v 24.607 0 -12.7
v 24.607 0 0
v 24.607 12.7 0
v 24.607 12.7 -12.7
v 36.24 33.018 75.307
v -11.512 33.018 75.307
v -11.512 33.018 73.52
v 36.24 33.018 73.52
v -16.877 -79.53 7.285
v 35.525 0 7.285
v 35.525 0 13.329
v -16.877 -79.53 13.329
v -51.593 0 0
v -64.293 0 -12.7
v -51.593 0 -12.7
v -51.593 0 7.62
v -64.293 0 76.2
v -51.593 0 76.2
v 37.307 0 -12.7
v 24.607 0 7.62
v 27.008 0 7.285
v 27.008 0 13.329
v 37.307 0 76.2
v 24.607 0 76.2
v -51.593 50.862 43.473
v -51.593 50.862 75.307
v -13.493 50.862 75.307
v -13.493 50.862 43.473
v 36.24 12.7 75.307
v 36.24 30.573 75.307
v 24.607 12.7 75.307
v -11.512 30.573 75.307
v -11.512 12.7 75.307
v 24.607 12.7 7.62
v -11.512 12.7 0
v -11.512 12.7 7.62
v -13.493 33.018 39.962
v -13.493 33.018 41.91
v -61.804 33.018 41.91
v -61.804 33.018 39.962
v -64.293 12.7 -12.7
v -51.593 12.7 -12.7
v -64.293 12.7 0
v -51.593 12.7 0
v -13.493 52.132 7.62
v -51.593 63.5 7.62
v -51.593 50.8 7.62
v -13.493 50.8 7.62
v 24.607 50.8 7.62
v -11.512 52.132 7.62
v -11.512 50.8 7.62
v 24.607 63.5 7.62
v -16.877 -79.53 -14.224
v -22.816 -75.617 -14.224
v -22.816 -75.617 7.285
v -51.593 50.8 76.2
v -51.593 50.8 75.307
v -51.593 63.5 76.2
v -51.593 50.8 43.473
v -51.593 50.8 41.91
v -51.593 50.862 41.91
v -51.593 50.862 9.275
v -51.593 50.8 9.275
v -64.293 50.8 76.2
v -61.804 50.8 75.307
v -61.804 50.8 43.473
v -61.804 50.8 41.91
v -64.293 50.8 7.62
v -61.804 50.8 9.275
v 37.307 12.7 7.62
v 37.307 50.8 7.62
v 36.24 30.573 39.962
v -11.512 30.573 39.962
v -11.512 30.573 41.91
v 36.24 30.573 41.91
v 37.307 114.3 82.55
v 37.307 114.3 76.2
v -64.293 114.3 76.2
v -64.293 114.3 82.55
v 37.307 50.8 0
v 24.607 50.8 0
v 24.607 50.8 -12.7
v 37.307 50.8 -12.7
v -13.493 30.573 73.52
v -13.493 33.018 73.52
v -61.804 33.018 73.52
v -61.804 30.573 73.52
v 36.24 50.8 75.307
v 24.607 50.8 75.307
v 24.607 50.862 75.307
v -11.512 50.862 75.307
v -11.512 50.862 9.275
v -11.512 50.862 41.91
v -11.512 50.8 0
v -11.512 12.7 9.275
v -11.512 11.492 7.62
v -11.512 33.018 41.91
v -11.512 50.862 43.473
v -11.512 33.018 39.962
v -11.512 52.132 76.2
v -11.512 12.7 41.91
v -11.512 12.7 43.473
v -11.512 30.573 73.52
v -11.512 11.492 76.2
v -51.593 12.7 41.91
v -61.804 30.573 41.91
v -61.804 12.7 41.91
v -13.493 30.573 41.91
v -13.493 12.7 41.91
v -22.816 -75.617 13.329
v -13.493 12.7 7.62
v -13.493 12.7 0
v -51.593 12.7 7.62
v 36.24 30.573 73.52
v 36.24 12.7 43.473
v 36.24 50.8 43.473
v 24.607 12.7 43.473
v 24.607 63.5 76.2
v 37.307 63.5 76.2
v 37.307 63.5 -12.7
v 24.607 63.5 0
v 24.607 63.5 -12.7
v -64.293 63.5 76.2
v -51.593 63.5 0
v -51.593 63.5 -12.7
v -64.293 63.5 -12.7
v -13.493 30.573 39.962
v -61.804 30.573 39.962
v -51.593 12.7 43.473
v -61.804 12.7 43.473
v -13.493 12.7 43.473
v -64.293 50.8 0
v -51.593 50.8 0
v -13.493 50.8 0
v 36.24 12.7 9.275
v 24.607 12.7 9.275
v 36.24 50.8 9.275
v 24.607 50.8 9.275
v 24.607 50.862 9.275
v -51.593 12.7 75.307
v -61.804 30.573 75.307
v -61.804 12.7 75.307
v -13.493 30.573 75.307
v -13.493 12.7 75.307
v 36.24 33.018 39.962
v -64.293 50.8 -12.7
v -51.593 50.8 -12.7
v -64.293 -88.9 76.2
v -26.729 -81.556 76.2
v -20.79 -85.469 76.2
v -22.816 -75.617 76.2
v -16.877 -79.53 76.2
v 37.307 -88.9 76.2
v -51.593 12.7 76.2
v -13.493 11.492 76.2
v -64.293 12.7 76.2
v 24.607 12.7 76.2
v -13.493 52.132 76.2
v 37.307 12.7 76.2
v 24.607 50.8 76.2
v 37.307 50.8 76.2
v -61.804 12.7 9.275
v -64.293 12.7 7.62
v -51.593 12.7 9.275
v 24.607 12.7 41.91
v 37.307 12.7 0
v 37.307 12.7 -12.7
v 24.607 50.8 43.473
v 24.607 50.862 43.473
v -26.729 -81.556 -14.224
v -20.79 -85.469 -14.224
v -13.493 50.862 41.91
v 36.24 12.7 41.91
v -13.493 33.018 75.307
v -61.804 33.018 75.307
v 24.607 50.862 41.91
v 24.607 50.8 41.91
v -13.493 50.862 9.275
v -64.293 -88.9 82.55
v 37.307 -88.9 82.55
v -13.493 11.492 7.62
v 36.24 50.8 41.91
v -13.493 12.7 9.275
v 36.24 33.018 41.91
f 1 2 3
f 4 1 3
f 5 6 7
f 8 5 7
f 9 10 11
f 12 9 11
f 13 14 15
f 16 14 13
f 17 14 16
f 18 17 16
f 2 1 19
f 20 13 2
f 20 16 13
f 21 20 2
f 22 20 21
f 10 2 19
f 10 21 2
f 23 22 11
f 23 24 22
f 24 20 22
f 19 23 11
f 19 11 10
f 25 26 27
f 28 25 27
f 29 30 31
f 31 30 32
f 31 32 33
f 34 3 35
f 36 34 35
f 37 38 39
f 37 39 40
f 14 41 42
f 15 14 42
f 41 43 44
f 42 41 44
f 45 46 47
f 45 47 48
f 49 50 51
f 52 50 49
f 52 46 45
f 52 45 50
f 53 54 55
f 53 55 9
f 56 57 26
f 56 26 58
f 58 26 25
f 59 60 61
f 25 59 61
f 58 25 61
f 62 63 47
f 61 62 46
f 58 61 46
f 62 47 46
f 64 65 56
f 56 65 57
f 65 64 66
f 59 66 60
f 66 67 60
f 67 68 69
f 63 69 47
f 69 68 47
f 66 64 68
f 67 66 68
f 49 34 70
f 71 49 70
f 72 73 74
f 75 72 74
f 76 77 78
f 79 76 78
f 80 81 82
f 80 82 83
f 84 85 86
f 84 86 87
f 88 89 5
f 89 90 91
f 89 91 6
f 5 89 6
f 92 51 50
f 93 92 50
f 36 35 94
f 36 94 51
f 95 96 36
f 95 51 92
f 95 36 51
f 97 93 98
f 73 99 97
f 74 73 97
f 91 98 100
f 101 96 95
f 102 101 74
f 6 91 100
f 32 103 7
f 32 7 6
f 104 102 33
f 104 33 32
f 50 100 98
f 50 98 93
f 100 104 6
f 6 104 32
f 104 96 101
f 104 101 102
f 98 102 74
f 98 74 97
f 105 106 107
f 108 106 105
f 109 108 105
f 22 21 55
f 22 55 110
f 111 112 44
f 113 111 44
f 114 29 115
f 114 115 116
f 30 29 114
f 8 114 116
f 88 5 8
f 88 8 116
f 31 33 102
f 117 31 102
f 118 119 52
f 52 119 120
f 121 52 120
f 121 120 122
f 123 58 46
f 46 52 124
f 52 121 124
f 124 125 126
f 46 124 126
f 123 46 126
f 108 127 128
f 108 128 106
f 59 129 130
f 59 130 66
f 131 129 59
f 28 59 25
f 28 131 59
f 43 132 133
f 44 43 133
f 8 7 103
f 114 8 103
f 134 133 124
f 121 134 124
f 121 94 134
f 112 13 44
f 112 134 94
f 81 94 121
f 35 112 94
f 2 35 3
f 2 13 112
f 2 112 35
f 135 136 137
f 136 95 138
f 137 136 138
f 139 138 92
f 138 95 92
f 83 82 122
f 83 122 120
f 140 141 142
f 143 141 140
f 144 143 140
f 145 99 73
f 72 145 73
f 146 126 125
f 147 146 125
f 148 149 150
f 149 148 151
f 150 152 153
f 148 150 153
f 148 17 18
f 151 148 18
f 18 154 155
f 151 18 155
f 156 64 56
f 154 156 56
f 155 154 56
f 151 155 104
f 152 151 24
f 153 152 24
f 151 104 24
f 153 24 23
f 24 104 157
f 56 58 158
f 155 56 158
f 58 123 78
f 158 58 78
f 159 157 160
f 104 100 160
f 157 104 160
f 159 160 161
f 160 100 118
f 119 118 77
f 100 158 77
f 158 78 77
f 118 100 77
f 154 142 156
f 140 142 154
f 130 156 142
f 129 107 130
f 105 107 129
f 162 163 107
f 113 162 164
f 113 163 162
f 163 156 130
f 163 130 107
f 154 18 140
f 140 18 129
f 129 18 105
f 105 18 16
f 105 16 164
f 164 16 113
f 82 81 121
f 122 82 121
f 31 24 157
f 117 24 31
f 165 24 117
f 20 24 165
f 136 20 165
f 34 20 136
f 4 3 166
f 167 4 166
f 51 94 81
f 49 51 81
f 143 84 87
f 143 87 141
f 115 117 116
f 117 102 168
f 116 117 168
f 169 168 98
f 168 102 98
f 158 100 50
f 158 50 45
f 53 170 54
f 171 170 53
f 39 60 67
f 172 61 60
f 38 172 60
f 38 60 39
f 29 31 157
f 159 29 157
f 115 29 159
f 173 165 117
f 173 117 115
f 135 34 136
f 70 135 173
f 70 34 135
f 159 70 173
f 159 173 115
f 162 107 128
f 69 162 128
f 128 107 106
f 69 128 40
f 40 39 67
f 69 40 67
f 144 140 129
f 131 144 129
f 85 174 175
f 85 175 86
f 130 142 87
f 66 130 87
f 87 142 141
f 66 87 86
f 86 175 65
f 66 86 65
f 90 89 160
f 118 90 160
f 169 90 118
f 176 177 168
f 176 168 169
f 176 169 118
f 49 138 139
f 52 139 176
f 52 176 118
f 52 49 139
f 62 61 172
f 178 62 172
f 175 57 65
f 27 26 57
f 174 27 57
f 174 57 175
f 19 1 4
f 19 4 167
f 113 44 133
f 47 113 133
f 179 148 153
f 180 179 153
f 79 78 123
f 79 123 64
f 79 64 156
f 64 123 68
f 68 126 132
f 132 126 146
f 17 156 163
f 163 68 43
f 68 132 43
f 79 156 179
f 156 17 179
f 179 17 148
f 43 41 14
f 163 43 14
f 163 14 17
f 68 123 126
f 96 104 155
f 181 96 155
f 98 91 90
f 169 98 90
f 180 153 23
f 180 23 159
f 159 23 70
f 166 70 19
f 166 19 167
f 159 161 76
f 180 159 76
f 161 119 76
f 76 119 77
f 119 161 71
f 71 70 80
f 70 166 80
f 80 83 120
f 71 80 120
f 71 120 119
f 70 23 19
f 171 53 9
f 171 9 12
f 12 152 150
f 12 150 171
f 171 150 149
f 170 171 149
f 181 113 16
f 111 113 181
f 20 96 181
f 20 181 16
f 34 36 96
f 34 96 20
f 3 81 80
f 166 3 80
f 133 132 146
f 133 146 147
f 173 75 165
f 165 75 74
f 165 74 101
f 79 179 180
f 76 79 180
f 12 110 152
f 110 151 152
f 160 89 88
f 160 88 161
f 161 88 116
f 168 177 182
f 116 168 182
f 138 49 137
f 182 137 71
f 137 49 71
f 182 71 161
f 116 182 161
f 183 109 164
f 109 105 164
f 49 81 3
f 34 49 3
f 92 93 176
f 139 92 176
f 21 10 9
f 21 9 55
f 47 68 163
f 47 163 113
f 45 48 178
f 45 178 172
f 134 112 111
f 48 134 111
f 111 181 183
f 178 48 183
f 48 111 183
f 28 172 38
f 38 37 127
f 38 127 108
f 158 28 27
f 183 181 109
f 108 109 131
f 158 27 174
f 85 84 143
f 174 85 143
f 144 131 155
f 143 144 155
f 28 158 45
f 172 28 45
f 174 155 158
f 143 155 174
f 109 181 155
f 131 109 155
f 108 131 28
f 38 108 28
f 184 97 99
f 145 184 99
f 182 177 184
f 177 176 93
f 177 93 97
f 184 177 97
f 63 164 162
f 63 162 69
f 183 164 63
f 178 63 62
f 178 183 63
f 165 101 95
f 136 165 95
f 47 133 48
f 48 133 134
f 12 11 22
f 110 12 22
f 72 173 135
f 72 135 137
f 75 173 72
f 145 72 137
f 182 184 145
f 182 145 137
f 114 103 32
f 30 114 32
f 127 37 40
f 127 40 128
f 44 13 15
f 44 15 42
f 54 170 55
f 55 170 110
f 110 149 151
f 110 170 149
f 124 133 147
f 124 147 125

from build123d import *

# Parameters (mm, degrees)
F0_W           = 12.7
F0_H           = 12.7
F0_H_2         = 38.1
F0_W_2         = 76.2
F1_DEPTH       = 7.62
F2_DEPTH       = 12.7
F3_DEPTH       = 76.2
F5_DEPTH       = 6.35
F6_W           = 1.980378
F6_H           = 38.16213
F7_DEPTH       = 76.2
F9_DEPTH       = 47.752
F9_DEPTH_BACK  = 50.292
F10_DEPTH      = 47.752
F10_DEPTH_BACK = 50.292
F11_W          = 1.980378
F11_H          = 68.58
F12_DEPTH      = 1.27
F12_DEPTH_BACK = 39.37
F14_DEPTH      = 90.17
F15_DEPTH      = 90.424
F16_W          = 7.112
F16_H          = 6.043921
F17_DEPTH      = 97.028


with BuildPart() as f1:
    # F0 (on Top) → F1 (new body)
    with BuildSketch(Plane.XY):
        with Locations((-57.942608, 57.15)):
            Rectangle(F0_W, F0_H)
        with Locations((-57.942608, 31.75)):
            Rectangle(F0_W, F0_H_2)
        with Locations((-57.942608, 6.35)):
            Rectangle(F0_W, F0_H)
        with Locations((-13.492608, 6.35)):
            Rectangle(F0_W_2, F0_H)
        with Locations((30.957392, 6.35)):
            Rectangle(F0_W, F0_H)
        with Locations((30.957392, 31.75)):
            Rectangle(F0_W, F0_H_2)
        with Locations((30.957392, 57.15)):
            Rectangle(F0_W, F0_H)
        with Locations((-13.492608, 57.15)):
            Rectangle(F0_W_2, F0_H)
    extrude(amount=F1_DEPTH)

    # F0 (on Top) → F2 (join)
    with BuildSketch(Plane.XY):
        with Locations((-57.942608, 6.35)):
            Rectangle(F0_W, F0_H)
        with Locations((-57.942608, 57.15)):
            Rectangle(F0_W, F0_H)
        with Locations((30.957392, 57.15)):
            Rectangle(F0_W, F0_H)
        with Locations((30.957392, 6.35)):
            Rectangle(F0_W, F0_H)
    extrude(amount=-F2_DEPTH)

    # F0 (on Top) → F3 (join)
    with BuildSketch(Plane.XY):
        with Locations((30.957392, 6.35)):
            Rectangle(F0_W, F0_H)
        with Locations((30.957392, 57.15)):
            Rectangle(F0_W, F0_H)
        with Locations((-57.942608, 57.15)):
            Rectangle(F0_W, F0_H)
        with Locations((-57.942608, 6.35)):
            Rectangle(F0_W, F0_H)
    extrude(amount=F3_DEPTH)

    # F4 (on face) → F5 (join)
    with BuildSketch(Plane.XY.offset(76.2)):
        Polygon((-64.292608, 63.5), (-64.292608, -88.9), (37.307392, -88.9), (37.307392, 63.5), (37.307392, 114.3), (-64.292608, 114.3), align=None)
    extrude(amount=F5_DEPTH)

    # F6 (on face) → F7 (join)
    with BuildSketch(Plane(origin=(0, 0, 76.2), x_dir=(1, 0, 0), z_dir=(0, 0, -1))):
        with Locations((-12.502419, -31.781065)):
            Rectangle(F6_W, F6_H)
    extrude(amount=F7_DEPTH)

    # F8 (on face) → F9 (join, two sides)
    with BuildSketch(Plane.YZ.offset(-11.51223)) as f9_sk:
        Polygon((30.57342, 41.91), (12.7, 41.91), (12.7, 9.275453), (50.86213, 9.275453), (50.86213, 41.91), (33.018019, 41.91), (33.018019, 39.962422), (30.57342, 39.962422), align=None)
    extrude(amount=F9_DEPTH)
    extrude(f9_sk.sketch, amount=-F9_DEPTH_BACK)

    # F8 (on face) → F10 (join, two sides)
    with BuildSketch(Plane.YZ.offset(-11.51223)) as f10_sk:
        Polygon((30.57342, 75.306833), (12.7, 75.306833), (12.7, 43.47302), (50.86213, 43.47302), (50.86213, 75.306833), (33.018019, 75.306833), (33.018019, 73.520184), (30.57342, 73.520184), align=None)
    extrude(amount=F10_DEPTH)
    extrude(f10_sk.sketch, amount=-F10_DEPTH_BACK)

    # F11 (on face) → F12 (join, two sides)
    with BuildSketch(Plane(origin=(0, 50.86213, 0), x_dir=(-1, 0, 0), z_dir=(0, 1, 0))) as f12_sk:
        with Locations((12.502419, 41.91)):
            Rectangle(F11_W, F11_H)
    extrude(amount=F12_DEPTH)
    extrude(f12_sk.sketch, amount=-F12_DEPTH_BACK)

    # F13 (on face) → F14 (join)
    with BuildSketch(Plane(origin=(0, 0, 76.2), x_dir=(1, 0, 0), z_dir=(0, 0, -1))):
        Polygon((-16.877052, 79.53029), (-20.790081, 85.46904), (-26.72883, 81.556011), (-22.815801, 75.617261), align=None)
    extrude(amount=F14_DEPTH)

    # F13 (on face) → F15 (join)
    with BuildSketch(Plane(origin=(0, 0, 76.2), x_dir=(1, 0, 0), z_dir=(0, 0, -1))):
        Polygon((-16.877052, 79.53029), (-20.790081, 85.46904), (-26.72883, 81.556011), (-22.815801, 75.617261), align=None)
    extrude(amount=F15_DEPTH)

    # F16 (on face) → F17 (join)
    with BuildSketch(Plane(origin=(-41.648083, -63.208712, 0), x_dir=(-0.835032, 0.550201, 0), z_dir=(0.550201, 0.835032, 0))):
        with Locations((-26.108759, 10.307214)):
            Rectangle(F16_W, F16_H)
    extrude(amount=F17_DEPTH)


solid = f1.part
